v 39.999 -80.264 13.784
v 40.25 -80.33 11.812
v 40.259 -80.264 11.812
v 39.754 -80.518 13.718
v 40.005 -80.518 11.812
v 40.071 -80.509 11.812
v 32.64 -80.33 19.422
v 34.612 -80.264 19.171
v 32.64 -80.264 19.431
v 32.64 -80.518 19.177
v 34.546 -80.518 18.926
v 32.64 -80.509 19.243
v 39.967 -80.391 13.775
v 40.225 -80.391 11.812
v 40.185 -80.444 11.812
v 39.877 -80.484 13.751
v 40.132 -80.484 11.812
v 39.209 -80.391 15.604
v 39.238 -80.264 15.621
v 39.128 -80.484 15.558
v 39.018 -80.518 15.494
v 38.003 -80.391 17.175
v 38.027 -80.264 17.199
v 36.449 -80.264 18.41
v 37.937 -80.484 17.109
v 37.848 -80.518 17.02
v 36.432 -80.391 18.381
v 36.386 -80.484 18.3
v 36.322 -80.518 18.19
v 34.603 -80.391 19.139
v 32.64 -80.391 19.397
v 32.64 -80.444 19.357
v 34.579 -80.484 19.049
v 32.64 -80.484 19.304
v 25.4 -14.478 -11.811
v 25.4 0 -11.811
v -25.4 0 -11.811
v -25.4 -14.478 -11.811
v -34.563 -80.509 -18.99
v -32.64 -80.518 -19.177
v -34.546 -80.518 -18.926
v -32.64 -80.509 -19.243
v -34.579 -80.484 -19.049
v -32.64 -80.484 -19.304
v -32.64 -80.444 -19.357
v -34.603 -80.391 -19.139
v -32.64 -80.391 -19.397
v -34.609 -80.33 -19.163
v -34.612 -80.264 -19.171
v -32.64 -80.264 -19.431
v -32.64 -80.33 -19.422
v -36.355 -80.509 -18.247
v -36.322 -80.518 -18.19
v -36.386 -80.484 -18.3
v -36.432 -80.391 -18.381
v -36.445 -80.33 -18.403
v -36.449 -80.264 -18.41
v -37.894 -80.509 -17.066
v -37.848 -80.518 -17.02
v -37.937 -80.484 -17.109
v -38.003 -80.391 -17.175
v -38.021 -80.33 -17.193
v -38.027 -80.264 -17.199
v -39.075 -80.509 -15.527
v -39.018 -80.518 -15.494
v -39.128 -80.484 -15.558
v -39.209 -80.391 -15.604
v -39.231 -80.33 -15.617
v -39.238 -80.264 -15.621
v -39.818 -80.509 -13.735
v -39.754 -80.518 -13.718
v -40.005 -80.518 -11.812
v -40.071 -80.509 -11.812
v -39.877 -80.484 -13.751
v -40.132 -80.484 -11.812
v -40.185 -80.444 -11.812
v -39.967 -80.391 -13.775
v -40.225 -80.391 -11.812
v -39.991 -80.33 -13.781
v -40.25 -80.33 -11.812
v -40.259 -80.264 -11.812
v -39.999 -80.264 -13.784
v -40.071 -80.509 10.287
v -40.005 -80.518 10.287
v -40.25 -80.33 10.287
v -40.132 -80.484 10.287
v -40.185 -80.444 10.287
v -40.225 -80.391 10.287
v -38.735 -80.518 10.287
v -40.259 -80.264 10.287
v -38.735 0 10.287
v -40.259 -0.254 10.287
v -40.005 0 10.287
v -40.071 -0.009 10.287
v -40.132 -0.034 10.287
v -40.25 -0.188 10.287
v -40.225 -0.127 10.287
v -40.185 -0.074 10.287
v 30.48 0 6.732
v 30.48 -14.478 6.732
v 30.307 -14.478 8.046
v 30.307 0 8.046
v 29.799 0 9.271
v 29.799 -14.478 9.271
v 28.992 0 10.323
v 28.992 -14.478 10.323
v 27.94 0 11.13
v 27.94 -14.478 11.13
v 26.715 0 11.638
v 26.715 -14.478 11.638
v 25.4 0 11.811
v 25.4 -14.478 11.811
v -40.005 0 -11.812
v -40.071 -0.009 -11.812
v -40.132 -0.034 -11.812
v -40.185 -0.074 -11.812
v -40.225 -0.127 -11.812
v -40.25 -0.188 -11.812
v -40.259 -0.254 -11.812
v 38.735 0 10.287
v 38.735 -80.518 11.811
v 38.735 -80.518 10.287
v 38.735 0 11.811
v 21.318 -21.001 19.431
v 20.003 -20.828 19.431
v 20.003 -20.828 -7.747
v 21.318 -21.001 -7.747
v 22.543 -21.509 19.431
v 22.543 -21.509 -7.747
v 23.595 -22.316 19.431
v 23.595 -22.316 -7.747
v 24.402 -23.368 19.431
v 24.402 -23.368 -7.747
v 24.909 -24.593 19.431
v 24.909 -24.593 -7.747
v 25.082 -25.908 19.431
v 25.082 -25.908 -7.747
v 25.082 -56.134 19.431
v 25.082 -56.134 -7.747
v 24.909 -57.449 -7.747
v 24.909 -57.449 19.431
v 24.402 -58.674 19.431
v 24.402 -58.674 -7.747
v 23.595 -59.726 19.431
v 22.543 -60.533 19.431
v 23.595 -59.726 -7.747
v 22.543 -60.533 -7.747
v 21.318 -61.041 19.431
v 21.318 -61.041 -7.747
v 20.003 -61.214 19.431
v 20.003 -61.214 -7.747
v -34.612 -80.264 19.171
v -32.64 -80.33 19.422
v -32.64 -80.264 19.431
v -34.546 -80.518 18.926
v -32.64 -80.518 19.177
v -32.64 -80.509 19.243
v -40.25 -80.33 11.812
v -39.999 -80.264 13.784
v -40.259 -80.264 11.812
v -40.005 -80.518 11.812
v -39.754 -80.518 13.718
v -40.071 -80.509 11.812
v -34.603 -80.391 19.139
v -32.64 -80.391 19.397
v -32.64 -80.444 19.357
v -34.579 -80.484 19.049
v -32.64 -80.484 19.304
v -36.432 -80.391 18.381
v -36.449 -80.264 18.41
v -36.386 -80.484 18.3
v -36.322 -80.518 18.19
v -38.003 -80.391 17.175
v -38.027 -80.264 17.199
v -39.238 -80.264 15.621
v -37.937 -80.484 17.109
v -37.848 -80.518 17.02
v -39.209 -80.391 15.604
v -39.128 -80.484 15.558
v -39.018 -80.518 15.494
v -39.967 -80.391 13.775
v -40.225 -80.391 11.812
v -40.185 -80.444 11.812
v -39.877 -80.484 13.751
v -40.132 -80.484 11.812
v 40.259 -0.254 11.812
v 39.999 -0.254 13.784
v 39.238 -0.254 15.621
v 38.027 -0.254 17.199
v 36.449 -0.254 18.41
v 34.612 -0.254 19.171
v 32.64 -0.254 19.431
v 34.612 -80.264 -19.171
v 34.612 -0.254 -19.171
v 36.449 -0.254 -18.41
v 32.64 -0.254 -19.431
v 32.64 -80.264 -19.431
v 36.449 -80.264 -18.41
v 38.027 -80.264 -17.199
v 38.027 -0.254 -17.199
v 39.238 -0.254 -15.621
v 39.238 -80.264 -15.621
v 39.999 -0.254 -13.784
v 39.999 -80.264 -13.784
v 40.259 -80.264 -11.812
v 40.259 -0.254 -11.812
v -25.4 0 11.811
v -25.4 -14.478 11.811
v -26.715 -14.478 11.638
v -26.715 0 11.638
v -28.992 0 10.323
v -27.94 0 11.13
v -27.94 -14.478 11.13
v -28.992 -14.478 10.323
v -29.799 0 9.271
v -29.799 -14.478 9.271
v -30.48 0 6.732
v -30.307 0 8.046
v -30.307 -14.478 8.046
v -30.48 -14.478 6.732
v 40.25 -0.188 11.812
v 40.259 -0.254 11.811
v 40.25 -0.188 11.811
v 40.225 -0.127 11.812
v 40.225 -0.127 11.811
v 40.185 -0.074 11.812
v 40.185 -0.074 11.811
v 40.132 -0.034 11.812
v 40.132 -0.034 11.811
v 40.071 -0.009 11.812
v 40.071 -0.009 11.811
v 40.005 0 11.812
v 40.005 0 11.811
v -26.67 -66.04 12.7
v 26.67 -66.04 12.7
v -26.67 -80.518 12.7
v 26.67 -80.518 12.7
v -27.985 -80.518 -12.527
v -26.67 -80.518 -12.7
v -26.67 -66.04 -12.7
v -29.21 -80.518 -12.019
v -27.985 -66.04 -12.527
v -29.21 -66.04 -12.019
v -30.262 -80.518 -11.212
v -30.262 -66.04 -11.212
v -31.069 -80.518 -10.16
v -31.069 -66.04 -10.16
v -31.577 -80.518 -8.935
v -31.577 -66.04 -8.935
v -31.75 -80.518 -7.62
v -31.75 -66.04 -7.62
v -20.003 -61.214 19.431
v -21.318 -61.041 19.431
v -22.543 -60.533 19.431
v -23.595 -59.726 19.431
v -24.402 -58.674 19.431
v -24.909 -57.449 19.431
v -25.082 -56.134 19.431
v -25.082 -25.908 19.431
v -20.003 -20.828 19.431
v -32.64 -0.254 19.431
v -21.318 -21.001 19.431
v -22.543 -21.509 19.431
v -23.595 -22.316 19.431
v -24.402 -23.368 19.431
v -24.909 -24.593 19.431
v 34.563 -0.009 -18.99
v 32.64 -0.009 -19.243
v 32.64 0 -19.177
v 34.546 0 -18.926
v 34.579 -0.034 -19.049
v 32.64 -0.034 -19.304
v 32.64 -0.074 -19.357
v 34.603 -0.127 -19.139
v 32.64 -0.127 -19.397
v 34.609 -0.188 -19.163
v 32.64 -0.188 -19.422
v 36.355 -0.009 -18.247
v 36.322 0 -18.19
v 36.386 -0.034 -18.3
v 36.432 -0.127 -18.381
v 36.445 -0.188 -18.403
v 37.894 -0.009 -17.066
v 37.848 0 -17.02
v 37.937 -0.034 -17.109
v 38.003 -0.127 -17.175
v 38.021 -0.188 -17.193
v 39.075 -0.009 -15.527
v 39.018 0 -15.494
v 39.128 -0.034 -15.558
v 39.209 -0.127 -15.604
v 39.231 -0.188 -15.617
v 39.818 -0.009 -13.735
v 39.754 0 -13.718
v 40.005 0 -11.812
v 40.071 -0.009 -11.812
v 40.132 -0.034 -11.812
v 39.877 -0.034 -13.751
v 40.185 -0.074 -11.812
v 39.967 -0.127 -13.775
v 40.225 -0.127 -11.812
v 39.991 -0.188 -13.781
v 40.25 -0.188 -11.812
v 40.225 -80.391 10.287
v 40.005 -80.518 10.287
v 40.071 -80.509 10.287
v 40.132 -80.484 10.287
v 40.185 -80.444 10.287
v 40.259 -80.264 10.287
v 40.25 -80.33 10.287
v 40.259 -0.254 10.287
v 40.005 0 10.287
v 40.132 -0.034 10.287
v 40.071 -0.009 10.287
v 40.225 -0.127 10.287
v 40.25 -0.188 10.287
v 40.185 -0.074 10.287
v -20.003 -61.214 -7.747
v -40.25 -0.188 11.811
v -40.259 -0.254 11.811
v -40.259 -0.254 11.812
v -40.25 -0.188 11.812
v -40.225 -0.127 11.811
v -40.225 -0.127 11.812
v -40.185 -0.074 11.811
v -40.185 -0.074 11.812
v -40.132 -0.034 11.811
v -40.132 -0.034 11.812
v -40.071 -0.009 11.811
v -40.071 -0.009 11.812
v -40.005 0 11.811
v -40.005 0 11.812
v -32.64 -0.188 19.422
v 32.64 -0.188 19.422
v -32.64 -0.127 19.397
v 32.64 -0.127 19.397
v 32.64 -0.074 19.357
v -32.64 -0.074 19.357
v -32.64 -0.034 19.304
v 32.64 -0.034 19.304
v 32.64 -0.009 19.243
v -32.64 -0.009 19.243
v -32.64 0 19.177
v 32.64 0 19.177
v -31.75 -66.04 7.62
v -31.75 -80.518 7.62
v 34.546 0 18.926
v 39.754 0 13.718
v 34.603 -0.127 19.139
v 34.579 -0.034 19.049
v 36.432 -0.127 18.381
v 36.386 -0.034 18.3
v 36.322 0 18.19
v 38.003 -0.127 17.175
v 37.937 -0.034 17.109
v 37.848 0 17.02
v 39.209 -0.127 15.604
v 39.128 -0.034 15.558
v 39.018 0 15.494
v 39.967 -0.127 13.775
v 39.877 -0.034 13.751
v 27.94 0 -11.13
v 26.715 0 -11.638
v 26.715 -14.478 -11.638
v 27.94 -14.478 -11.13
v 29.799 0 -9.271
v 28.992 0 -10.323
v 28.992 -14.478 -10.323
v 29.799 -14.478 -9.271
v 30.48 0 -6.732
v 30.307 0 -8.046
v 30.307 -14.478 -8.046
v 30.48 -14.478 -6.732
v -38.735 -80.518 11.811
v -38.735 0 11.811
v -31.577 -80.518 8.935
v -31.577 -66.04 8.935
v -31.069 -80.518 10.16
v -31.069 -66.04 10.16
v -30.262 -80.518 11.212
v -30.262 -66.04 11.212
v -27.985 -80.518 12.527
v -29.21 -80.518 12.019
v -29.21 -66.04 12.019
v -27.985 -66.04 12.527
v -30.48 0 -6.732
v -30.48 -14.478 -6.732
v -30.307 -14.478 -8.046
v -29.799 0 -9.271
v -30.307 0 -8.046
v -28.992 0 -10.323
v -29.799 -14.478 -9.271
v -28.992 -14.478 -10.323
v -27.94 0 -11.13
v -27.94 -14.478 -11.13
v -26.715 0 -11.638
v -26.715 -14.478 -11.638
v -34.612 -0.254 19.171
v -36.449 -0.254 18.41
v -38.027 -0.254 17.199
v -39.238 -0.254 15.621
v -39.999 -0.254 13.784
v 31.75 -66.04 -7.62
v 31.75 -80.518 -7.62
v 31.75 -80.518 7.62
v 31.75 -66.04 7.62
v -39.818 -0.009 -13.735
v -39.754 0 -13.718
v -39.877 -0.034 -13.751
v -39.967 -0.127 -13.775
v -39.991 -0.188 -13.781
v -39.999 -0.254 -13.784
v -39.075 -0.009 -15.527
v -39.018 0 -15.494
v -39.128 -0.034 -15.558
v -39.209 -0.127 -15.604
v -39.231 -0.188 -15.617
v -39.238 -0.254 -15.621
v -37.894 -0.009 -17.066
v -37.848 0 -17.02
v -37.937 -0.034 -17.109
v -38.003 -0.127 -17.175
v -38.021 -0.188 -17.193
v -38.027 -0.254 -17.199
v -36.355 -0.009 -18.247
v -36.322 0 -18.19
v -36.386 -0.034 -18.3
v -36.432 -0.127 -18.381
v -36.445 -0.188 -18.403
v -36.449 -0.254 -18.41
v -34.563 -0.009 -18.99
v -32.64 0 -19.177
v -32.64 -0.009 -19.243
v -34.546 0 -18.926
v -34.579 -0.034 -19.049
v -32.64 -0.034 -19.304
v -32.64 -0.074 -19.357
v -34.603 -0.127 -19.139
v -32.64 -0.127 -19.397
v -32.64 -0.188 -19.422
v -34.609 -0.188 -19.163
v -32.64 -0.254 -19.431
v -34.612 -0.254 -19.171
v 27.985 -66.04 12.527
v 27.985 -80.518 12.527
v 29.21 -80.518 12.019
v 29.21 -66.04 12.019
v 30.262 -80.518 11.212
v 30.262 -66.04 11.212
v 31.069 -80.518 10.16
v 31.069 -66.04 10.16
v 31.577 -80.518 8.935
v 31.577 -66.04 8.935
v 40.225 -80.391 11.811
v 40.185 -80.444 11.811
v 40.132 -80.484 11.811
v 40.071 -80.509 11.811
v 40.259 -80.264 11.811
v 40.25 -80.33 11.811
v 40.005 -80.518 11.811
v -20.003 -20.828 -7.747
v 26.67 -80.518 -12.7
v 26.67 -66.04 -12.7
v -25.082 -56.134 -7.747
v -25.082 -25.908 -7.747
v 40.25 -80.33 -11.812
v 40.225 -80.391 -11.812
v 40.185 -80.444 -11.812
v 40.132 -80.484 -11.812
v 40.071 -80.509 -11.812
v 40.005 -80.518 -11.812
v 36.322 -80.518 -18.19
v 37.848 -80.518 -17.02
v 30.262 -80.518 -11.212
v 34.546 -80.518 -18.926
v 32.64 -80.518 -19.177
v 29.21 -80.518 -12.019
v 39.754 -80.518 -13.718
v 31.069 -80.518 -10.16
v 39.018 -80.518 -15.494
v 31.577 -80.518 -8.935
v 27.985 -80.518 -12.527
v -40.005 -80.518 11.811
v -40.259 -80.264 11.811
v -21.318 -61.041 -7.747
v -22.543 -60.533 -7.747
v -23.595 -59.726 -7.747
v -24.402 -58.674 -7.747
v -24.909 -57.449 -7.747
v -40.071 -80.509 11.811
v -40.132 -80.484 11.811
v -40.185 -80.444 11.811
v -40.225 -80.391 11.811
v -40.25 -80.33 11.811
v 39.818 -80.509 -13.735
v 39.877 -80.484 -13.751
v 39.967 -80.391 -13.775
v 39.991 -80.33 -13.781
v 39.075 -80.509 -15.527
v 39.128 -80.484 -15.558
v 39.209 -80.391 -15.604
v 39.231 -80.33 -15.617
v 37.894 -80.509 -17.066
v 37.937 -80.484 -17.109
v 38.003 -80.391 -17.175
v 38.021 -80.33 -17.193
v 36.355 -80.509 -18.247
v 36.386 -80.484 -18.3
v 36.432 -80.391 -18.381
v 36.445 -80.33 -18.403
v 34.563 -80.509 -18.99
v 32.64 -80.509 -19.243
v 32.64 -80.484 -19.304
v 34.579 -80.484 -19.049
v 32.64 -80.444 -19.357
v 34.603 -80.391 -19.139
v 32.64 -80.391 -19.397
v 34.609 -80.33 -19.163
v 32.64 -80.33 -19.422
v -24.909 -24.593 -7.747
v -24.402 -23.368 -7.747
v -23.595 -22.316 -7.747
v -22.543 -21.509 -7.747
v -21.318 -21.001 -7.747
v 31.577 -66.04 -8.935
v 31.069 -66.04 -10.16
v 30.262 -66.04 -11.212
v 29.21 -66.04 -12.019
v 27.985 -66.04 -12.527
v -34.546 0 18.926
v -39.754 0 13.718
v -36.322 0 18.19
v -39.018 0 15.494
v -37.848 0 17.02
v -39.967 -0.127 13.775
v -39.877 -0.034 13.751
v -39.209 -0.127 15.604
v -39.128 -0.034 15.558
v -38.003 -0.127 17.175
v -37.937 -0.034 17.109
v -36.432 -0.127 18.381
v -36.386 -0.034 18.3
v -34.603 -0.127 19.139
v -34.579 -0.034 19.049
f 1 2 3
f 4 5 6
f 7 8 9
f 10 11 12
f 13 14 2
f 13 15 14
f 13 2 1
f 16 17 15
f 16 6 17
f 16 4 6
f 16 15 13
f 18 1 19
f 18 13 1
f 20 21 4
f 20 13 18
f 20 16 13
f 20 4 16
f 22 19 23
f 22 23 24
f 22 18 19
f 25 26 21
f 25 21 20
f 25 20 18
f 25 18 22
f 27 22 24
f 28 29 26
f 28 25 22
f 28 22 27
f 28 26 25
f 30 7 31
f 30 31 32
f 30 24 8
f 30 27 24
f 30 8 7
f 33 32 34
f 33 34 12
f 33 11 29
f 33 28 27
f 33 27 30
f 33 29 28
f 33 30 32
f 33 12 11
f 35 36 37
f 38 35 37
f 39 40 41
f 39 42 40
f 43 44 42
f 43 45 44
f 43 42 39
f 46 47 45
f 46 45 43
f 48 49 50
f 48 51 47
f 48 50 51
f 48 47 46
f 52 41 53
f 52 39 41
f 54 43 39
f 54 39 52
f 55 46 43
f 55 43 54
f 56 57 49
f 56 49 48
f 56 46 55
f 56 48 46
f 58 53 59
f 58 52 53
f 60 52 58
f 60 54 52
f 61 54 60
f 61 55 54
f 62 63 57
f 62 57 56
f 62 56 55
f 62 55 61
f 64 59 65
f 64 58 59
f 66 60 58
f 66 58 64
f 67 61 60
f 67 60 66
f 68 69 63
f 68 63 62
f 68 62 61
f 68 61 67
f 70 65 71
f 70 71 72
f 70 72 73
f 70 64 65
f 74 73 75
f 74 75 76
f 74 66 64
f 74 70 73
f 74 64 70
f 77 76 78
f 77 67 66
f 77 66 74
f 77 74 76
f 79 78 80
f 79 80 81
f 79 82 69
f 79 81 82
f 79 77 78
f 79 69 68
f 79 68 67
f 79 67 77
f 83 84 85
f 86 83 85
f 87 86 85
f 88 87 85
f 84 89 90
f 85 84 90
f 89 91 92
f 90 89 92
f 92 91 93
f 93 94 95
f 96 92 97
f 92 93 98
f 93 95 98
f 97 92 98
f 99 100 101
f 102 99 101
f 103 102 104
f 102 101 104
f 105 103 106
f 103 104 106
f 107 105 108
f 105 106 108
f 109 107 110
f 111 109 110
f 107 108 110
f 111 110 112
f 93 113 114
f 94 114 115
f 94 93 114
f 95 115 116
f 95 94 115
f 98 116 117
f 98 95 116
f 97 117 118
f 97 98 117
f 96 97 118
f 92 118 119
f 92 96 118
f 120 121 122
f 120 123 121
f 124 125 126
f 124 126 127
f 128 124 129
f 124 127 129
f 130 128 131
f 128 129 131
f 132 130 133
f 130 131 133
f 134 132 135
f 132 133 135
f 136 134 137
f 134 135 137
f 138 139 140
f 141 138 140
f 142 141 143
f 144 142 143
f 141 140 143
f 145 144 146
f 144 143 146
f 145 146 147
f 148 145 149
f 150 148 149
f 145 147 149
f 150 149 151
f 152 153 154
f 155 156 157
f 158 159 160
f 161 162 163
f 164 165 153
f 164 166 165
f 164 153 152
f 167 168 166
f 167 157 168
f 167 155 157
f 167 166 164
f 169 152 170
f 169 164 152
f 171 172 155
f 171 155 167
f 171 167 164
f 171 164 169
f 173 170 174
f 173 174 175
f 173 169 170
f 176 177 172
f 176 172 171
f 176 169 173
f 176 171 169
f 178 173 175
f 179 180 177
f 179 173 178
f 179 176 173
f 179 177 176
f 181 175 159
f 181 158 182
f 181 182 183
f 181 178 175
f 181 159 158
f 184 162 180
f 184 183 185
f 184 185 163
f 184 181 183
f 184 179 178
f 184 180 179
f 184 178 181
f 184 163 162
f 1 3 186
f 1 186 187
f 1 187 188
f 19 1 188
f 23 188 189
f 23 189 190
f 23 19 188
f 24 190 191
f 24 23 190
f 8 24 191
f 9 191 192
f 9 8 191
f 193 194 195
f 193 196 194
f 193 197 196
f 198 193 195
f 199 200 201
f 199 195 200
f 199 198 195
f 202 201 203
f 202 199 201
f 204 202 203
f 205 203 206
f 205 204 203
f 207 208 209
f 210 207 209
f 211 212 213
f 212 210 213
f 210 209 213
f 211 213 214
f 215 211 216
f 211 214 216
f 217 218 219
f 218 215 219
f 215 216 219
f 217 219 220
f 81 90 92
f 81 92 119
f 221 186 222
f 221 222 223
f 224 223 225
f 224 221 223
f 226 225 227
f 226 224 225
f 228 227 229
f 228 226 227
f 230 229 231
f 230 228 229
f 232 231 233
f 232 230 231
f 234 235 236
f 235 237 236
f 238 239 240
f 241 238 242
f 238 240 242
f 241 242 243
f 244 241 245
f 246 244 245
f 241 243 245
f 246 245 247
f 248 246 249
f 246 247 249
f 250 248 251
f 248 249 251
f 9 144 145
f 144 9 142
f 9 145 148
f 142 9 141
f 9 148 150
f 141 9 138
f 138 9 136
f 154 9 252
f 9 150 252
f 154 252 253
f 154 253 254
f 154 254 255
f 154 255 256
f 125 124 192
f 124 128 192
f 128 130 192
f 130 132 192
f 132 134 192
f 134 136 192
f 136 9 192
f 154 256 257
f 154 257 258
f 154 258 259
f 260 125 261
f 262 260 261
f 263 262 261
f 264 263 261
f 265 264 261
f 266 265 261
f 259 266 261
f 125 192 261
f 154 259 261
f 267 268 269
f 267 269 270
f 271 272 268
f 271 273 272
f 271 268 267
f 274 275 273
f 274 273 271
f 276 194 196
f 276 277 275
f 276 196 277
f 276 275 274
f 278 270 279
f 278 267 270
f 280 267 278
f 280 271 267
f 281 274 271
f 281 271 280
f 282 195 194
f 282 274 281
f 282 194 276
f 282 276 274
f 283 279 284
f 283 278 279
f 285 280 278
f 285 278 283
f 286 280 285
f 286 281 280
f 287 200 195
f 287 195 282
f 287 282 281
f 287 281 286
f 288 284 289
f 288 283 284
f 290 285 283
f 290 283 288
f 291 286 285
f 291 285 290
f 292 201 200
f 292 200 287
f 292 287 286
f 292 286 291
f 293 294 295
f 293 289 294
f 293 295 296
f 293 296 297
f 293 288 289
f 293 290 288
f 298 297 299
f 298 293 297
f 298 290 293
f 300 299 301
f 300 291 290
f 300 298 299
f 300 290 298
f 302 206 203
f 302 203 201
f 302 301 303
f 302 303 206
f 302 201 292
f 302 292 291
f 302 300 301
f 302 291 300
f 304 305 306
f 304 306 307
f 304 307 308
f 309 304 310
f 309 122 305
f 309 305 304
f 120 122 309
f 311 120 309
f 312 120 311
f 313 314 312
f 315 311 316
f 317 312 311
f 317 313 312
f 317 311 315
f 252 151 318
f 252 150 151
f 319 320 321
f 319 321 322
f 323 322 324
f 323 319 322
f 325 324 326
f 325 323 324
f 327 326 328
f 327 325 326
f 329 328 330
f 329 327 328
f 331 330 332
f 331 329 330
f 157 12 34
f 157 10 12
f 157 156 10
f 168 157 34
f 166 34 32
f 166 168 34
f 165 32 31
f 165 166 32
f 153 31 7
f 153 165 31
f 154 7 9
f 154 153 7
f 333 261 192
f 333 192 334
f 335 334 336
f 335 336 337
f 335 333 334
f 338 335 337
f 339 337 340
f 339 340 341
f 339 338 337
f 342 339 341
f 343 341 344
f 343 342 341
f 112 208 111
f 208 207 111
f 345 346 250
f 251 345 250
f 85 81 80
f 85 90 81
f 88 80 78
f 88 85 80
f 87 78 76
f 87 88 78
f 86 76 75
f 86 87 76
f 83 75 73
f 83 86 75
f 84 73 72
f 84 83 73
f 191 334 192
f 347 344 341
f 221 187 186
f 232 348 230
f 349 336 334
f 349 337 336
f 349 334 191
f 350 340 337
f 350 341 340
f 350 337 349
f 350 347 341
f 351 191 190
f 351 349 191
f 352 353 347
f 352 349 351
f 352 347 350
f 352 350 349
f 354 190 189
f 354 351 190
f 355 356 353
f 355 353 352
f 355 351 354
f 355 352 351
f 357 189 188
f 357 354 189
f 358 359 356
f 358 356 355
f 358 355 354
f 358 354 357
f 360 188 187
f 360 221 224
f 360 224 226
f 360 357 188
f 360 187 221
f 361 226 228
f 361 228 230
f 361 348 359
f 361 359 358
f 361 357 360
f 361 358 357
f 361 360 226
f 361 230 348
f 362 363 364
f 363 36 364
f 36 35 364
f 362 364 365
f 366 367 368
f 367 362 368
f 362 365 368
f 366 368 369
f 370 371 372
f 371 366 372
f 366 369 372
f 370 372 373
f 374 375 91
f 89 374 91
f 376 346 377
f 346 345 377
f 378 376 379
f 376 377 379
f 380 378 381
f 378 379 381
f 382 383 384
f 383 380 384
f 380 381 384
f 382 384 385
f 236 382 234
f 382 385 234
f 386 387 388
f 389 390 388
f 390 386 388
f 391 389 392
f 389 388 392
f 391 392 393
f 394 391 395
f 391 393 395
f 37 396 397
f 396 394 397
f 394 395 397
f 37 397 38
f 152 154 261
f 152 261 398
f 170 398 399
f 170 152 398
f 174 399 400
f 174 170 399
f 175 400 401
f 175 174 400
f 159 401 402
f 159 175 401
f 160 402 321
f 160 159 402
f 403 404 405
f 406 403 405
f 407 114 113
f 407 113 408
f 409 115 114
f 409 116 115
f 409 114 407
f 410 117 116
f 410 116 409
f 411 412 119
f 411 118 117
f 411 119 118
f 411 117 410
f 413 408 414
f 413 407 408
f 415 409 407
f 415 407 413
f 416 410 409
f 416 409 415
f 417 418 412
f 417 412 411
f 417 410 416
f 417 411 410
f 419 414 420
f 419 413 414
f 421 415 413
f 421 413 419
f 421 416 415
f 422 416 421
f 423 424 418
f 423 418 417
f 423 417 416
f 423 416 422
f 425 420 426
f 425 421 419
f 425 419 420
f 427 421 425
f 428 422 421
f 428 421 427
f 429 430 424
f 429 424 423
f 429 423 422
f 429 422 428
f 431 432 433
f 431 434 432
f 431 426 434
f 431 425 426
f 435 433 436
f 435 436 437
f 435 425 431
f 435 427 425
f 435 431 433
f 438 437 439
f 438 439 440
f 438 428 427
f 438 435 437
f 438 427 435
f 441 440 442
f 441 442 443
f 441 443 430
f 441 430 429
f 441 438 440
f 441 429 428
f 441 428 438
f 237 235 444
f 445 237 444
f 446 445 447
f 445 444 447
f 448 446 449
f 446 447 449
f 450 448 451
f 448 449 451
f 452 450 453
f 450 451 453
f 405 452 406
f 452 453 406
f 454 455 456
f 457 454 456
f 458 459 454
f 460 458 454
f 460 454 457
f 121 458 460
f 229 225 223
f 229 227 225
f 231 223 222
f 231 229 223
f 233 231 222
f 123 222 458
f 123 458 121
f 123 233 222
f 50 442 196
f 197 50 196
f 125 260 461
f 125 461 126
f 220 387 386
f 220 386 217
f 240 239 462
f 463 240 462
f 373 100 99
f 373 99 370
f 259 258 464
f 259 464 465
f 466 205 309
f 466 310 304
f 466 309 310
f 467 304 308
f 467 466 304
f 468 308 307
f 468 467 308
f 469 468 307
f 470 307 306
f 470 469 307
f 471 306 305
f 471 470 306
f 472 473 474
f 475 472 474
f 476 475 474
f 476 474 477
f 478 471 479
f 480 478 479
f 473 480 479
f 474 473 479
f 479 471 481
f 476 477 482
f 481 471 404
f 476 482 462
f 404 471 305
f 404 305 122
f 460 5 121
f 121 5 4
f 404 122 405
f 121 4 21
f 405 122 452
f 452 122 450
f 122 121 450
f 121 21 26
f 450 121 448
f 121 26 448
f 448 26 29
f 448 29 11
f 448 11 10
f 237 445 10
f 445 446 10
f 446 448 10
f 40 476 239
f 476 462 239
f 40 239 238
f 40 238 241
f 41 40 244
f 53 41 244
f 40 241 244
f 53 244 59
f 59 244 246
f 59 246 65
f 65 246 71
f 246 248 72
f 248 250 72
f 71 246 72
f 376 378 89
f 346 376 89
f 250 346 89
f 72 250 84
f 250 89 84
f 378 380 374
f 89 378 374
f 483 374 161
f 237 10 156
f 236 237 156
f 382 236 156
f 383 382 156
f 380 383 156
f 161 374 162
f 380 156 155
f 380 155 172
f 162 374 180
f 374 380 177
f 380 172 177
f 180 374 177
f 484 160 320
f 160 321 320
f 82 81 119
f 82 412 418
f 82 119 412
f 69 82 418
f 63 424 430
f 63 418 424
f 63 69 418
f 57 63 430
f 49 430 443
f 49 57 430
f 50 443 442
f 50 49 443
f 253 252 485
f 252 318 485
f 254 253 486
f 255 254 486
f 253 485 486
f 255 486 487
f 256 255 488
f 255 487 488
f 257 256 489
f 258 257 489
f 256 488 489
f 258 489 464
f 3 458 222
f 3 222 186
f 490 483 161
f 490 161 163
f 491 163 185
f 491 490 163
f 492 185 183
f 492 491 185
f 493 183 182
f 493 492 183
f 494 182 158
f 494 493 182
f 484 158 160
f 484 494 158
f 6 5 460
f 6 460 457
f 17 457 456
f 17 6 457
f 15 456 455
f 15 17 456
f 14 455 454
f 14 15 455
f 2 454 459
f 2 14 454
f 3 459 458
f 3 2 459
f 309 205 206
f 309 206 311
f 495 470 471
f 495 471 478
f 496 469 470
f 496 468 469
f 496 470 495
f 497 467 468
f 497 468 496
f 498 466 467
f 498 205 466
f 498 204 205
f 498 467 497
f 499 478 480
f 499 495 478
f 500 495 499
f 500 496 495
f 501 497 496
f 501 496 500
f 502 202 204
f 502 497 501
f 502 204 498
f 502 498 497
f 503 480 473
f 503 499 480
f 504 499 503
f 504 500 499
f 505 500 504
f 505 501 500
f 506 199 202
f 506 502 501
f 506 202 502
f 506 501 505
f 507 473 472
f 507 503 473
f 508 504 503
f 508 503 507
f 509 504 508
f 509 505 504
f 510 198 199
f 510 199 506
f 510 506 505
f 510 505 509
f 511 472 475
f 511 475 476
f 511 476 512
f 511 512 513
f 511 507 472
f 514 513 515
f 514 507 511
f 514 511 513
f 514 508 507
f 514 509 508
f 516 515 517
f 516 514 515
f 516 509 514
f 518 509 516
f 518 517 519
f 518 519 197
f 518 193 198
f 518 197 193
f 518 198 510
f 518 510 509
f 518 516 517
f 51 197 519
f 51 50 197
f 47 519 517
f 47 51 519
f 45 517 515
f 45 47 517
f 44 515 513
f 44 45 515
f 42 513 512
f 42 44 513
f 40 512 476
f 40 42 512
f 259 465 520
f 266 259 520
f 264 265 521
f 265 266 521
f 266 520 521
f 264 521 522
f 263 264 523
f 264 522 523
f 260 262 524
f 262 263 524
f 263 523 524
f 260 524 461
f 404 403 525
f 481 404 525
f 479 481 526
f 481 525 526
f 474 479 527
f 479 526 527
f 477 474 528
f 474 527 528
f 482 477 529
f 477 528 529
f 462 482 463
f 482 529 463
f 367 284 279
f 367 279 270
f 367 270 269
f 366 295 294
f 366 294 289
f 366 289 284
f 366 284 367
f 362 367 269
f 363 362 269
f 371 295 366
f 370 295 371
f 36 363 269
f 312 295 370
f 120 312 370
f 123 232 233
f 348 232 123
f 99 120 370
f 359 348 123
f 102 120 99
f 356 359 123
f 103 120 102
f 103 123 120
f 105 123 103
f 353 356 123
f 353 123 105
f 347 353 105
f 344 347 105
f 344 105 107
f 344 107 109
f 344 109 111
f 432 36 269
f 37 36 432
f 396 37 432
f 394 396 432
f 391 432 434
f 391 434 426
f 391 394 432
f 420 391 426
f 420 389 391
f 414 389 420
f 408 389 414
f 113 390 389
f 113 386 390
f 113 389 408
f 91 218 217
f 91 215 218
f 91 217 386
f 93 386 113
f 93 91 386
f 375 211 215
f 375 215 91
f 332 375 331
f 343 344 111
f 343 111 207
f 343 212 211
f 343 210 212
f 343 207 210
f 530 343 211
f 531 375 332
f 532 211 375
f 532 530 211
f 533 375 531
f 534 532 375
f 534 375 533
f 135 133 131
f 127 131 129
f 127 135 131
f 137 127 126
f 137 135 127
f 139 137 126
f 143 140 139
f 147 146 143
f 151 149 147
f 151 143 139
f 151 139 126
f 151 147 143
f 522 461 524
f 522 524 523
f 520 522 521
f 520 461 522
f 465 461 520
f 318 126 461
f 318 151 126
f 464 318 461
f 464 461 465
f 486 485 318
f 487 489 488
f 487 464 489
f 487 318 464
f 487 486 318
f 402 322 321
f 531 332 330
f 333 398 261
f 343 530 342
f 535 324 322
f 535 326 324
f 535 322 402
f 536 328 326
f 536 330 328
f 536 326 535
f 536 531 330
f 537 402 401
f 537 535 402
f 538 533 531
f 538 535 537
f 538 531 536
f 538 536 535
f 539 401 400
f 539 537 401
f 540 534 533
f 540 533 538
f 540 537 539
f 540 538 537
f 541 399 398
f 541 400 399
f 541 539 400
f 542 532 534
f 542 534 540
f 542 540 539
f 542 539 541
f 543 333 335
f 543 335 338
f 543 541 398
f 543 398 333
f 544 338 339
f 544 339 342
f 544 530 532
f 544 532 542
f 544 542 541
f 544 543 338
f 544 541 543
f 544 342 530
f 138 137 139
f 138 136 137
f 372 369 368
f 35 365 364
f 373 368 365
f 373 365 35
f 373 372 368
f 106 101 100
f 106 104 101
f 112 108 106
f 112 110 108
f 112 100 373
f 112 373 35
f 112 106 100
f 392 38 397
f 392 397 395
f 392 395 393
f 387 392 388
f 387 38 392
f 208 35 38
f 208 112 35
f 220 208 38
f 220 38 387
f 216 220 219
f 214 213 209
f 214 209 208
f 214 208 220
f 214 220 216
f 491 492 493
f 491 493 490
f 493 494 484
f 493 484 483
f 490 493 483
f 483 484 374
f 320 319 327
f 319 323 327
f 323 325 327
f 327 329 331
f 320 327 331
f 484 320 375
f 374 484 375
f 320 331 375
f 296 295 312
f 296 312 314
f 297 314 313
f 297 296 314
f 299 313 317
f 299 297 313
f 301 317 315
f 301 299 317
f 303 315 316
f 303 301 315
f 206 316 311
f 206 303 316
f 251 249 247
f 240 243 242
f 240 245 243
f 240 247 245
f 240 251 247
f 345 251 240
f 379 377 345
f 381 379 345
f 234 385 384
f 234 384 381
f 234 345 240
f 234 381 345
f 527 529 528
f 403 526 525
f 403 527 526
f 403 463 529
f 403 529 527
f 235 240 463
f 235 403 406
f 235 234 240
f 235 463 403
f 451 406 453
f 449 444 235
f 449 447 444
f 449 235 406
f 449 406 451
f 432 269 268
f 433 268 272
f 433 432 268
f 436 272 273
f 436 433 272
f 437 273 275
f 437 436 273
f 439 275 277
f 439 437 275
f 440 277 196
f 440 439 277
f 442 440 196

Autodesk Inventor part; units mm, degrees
ref_plane "YZ Plane" through (0, 0, 0) normal (1, 0, 0) x (0, 1, 0)
ref_plane "XZ Plane" through (0, 0, 0) normal (0, 1, 0) x (-1, 0, 0)
ref_plane "XY Plane" through (0, 0, 0) normal (0, 0, 1) x (1, 0, 0)
sketch "Sketch1" plane through (0, 0, 0) normal (0, 1, 0) x (-1, 0, 0)
  line L0 (-40.259, 19.431) -> (40.259, 19.431)
  line L1 (40.259, 19.431) -> (40.259, -19.431)
  line L2 (40.259, -19.431) -> (-40.259, -19.431)
  line L3 (-40.259, -19.431) -> (-40.259, 19.431)
  line L4 (-40.259, 11.811) -> (-38.735, 11.811)
  line L5 (-38.735, 11.811) -> (-38.735, 10.287)
  line L6 (-38.735, 10.287) -> (-40.259, 10.287)
  line L7 (-40.259, 10.287) -> (-40.259, 11.811)
  line L8 (40.259, 11.811) -> (38.735, 11.811)
  line L9 (38.735, 11.811) -> (38.735, 10.287)
  line L10 (38.735, 10.287) -> (40.259, 10.287)
  line L11 (40.259, 10.287) -> (40.259, 11.811)
  point P0 (0, 0)
  point P1 (40.259, 0)
  point P2 (0, -19.431)
  point P3 (0, 0)
  dimension "d0" = 80.518
  dimension "d1" = 38.862
  dimension "d20" = 1.524
  dimension "d21" = 7.62
extrude "Extrusion1" add sketch "Sketch1" against normal blind 80.518 contours L0 L1 L8 L9 L10 L2 L3 L6 L5 L4
sketch "Sketch2" plane through (0, 0, 0) normal (0, 1, 0) x (-1, 0, 0)
  line L0 (-30.48, -11.811) -> (30.48, -11.811)
  line L1 (30.48, -11.811) -> (30.48, 11.811)
  line L2 (30.48, 11.811) -> (-30.48, 11.811)
  line L3 (-30.48, 11.811) -> (-30.48, -11.811)
  line L4 (40.259, -19.431) -> (-40.259, -19.431) projected
  line L5 (-40.259, 19.431) -> (40.259, 19.431) projected
  point P0 (0, 0)
  point P1 (0, 11.811)
  point P2 (-30.48, 0)
  dimension "d4" = 60.96
  dimension "d5" = 23.622
extrude "Extrusion2" cut sketch "Sketch2" against normal blind 14.478
sketch "Sketch3" plane through (0, -80.518, 0) normal (0, -1, 0) x (1, 0, 0)
  line L0 (-31.75, -12.7) -> (31.75, -12.7)
  line L1 (31.75, -12.7) -> (31.75, 12.7)
  line L2 (31.75, 12.7) -> (-31.75, 12.7)
  line L3 (-31.75, 12.7) -> (-31.75, -12.7)
  point P0 (0, 0)
  point P1 (0, -12.7)
  point P2 (-31.75, 0)
  dimension "d10" = 63.5
  dimension "d11" = 25.4
extrude "Extrusion3" cut sketch "Sketch3" against normal blind 14.478
sketch "Sketch4" plane through (40.259, 0, 19.431) normal (0, 0, 1) x (-1, 0, 0)
  line L0 (65.3415, 20.828) -> (15.1765, 20.828)
  line L1 (15.1765, 20.828) -> (15.1765, 61.214)
  line L2 (15.1765, 61.214) -> (65.3415, 61.214)
  line L3 (65.3415, 61.214) -> (65.3415, 20.828)
  line L4 (0, 0) -> (80.518, 0) projected
  point P0 (40.259, 0)
  point P1 (40.259, 0)
  point P2 (40.259, 20.828)
  dimension "d15" = 20.828
  dimension "d16" = 40.386
  dimension "d17" = 50.165
extrude "Extrusion4" cut sketch "Sketch4" against normal blind 27.178
fillet "Fillet1" radius 5.08 12 edges at (30.48, -7.239, 11.811) (30.48, -7.239, -11.811) (-30.48, -7.239, -11.811) (-30.48, -7.239, 11.811) (-31.75, -73.279, -12.7) (-31.75, -73.279, 12.7) (31.75, -73.279, 12.7) (31.75, -73.279, -12.7) (-25.0825, -20.828, 5.842) (25.0825, -20.828, 5.842) (25.0825, -61.214, 5.842) (-25.0825, -61.214, 5.842)
fillet "Fillet1" radius 7.62 4 edges at (-40.259, -40.259, 19.431) (-40.259, -40.259, -19.431) (40.259, -40.259, 19.431) (40.259, -40.259, -19.431)
fillet "Fillet2" radius 0.254 16 edges at (38.0273, -80.518, -17.1993) (0, -80.518, -19.431) (-38.0273, -80.518, -17.1993) (-40.259, -80.518, -0.7623) (40.259, -80.518, -0.7623) (0, -80.518, 19.431) (-38.0273, -80.518, 17.1993) (38.0273, -80.518, 17.1993) (0, 0, 19.431) (-38.0273, 0, 17.1993) (38.0273, 0, 17.1993) (38.0273, 0, -17.1993) (0, 0, -19.431) (-38.0273, 0, -17.1993) (-40.259, 0, -0.7623) (40.259, 0, -0.7623)
properties part number "T9 Passenger Section"
